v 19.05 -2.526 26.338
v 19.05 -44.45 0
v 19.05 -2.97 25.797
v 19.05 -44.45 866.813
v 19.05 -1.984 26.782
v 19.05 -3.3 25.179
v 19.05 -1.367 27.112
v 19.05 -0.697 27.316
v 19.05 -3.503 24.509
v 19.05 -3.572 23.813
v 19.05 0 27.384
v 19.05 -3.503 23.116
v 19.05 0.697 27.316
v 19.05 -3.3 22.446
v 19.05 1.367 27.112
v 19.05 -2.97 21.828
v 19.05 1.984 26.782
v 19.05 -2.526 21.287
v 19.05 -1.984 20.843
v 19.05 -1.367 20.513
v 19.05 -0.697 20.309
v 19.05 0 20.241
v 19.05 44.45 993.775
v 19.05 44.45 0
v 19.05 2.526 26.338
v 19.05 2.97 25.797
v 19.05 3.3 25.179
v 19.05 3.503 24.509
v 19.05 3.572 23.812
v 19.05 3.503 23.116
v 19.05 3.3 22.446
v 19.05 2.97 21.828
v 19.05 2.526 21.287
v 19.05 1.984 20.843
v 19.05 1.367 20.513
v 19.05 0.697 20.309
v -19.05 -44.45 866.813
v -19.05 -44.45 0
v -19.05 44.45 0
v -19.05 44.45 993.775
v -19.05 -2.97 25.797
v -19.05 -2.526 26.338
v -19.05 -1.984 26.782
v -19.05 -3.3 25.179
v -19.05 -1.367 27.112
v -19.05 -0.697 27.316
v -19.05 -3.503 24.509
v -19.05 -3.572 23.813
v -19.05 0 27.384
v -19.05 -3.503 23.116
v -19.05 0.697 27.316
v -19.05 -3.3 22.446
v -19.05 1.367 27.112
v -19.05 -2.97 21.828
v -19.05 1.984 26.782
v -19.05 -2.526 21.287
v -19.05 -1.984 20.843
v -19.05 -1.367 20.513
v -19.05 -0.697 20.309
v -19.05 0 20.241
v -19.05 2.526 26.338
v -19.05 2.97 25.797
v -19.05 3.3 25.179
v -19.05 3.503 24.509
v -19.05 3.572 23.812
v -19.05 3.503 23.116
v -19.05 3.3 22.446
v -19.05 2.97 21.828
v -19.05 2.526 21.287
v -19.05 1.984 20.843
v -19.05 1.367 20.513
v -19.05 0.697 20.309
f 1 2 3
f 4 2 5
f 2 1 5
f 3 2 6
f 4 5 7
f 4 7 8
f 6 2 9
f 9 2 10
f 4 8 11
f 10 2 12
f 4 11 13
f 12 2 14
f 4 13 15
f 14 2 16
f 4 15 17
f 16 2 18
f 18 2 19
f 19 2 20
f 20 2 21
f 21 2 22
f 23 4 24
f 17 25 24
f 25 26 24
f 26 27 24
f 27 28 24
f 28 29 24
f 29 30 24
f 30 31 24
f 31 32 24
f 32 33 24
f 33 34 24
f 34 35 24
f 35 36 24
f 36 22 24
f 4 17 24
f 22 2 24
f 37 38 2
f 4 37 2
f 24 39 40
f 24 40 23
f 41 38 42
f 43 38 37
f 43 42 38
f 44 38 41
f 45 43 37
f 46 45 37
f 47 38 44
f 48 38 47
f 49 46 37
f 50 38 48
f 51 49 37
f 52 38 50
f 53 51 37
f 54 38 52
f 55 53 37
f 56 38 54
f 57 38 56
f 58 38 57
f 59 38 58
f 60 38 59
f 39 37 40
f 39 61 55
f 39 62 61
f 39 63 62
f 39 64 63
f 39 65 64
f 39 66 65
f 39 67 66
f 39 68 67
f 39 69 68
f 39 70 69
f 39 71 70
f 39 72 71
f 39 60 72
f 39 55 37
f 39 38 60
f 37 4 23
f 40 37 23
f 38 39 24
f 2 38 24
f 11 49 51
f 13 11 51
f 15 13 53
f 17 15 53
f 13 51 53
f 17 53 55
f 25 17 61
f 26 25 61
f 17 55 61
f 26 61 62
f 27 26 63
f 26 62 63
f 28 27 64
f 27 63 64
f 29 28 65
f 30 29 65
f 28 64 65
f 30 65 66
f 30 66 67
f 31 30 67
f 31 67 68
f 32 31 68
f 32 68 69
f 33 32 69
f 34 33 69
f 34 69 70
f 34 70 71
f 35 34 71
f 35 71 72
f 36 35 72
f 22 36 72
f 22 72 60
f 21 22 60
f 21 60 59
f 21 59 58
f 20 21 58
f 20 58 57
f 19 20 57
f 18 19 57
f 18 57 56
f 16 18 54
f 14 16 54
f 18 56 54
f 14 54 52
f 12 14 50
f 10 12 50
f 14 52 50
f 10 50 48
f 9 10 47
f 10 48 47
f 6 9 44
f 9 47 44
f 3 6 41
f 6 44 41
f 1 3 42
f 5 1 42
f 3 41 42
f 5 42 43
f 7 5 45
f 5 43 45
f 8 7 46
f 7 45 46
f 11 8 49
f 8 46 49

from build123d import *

# Parameters (mm, degrees)
SKETCH1_W                       = 38.1
SKETCH1_H                       = 88.9
BOSS_EXTRUDE1_DEPTH             = 1143
F_9_32_0_28125_DIAMETER_HOLE1_D = 7.14375
SKETCH5_R                       = 3.571875
CUT_EXTRUDE1_DEPTH              = 39.1


with BuildPart() as part:
    # Sketch1 → Boss-Extrude1 (new body)
    with BuildSketch(Plane.XY):
        Rectangle(SKETCH1_W, SKETCH1_H)
    extrude(amount=BOSS_EXTRUDE1_DEPTH)

    # 9/32 (0.28125) Diameter Hole1 (through all)
    with Locations(Plane(origin=(19.05, 0, 0), x_dir=(0, 0, -1), z_dir=(1, 0, 0))):
        with Locations((-1128.7125, 0), (-23.8125, 0)):
            Hole(F_9_32_0_28125_DIAMETER_HOLE1_D / 2)

    # Sketch5 → Cut-Extrude1 (cut, through all)
    with BuildSketch(Plane(origin=(19.05, 0, 0), x_dir=(0, 0, -1), z_dir=(1, 0, 0))):
        Polygon((-866.812642201, -44.45), (-993.775, 44.45), (-1143, 44.45), (-1143, -44.45), (-869.95, -44.45), align=None)
        with Locations((-1128.7125, 0)):
            Circle(SKETCH5_R, mode=Mode.SUBTRACT)
    extrude(amount=-CUT_EXTRUDE1_DEPTH, mode=Mode.SUBTRACT)


solid = part.part
